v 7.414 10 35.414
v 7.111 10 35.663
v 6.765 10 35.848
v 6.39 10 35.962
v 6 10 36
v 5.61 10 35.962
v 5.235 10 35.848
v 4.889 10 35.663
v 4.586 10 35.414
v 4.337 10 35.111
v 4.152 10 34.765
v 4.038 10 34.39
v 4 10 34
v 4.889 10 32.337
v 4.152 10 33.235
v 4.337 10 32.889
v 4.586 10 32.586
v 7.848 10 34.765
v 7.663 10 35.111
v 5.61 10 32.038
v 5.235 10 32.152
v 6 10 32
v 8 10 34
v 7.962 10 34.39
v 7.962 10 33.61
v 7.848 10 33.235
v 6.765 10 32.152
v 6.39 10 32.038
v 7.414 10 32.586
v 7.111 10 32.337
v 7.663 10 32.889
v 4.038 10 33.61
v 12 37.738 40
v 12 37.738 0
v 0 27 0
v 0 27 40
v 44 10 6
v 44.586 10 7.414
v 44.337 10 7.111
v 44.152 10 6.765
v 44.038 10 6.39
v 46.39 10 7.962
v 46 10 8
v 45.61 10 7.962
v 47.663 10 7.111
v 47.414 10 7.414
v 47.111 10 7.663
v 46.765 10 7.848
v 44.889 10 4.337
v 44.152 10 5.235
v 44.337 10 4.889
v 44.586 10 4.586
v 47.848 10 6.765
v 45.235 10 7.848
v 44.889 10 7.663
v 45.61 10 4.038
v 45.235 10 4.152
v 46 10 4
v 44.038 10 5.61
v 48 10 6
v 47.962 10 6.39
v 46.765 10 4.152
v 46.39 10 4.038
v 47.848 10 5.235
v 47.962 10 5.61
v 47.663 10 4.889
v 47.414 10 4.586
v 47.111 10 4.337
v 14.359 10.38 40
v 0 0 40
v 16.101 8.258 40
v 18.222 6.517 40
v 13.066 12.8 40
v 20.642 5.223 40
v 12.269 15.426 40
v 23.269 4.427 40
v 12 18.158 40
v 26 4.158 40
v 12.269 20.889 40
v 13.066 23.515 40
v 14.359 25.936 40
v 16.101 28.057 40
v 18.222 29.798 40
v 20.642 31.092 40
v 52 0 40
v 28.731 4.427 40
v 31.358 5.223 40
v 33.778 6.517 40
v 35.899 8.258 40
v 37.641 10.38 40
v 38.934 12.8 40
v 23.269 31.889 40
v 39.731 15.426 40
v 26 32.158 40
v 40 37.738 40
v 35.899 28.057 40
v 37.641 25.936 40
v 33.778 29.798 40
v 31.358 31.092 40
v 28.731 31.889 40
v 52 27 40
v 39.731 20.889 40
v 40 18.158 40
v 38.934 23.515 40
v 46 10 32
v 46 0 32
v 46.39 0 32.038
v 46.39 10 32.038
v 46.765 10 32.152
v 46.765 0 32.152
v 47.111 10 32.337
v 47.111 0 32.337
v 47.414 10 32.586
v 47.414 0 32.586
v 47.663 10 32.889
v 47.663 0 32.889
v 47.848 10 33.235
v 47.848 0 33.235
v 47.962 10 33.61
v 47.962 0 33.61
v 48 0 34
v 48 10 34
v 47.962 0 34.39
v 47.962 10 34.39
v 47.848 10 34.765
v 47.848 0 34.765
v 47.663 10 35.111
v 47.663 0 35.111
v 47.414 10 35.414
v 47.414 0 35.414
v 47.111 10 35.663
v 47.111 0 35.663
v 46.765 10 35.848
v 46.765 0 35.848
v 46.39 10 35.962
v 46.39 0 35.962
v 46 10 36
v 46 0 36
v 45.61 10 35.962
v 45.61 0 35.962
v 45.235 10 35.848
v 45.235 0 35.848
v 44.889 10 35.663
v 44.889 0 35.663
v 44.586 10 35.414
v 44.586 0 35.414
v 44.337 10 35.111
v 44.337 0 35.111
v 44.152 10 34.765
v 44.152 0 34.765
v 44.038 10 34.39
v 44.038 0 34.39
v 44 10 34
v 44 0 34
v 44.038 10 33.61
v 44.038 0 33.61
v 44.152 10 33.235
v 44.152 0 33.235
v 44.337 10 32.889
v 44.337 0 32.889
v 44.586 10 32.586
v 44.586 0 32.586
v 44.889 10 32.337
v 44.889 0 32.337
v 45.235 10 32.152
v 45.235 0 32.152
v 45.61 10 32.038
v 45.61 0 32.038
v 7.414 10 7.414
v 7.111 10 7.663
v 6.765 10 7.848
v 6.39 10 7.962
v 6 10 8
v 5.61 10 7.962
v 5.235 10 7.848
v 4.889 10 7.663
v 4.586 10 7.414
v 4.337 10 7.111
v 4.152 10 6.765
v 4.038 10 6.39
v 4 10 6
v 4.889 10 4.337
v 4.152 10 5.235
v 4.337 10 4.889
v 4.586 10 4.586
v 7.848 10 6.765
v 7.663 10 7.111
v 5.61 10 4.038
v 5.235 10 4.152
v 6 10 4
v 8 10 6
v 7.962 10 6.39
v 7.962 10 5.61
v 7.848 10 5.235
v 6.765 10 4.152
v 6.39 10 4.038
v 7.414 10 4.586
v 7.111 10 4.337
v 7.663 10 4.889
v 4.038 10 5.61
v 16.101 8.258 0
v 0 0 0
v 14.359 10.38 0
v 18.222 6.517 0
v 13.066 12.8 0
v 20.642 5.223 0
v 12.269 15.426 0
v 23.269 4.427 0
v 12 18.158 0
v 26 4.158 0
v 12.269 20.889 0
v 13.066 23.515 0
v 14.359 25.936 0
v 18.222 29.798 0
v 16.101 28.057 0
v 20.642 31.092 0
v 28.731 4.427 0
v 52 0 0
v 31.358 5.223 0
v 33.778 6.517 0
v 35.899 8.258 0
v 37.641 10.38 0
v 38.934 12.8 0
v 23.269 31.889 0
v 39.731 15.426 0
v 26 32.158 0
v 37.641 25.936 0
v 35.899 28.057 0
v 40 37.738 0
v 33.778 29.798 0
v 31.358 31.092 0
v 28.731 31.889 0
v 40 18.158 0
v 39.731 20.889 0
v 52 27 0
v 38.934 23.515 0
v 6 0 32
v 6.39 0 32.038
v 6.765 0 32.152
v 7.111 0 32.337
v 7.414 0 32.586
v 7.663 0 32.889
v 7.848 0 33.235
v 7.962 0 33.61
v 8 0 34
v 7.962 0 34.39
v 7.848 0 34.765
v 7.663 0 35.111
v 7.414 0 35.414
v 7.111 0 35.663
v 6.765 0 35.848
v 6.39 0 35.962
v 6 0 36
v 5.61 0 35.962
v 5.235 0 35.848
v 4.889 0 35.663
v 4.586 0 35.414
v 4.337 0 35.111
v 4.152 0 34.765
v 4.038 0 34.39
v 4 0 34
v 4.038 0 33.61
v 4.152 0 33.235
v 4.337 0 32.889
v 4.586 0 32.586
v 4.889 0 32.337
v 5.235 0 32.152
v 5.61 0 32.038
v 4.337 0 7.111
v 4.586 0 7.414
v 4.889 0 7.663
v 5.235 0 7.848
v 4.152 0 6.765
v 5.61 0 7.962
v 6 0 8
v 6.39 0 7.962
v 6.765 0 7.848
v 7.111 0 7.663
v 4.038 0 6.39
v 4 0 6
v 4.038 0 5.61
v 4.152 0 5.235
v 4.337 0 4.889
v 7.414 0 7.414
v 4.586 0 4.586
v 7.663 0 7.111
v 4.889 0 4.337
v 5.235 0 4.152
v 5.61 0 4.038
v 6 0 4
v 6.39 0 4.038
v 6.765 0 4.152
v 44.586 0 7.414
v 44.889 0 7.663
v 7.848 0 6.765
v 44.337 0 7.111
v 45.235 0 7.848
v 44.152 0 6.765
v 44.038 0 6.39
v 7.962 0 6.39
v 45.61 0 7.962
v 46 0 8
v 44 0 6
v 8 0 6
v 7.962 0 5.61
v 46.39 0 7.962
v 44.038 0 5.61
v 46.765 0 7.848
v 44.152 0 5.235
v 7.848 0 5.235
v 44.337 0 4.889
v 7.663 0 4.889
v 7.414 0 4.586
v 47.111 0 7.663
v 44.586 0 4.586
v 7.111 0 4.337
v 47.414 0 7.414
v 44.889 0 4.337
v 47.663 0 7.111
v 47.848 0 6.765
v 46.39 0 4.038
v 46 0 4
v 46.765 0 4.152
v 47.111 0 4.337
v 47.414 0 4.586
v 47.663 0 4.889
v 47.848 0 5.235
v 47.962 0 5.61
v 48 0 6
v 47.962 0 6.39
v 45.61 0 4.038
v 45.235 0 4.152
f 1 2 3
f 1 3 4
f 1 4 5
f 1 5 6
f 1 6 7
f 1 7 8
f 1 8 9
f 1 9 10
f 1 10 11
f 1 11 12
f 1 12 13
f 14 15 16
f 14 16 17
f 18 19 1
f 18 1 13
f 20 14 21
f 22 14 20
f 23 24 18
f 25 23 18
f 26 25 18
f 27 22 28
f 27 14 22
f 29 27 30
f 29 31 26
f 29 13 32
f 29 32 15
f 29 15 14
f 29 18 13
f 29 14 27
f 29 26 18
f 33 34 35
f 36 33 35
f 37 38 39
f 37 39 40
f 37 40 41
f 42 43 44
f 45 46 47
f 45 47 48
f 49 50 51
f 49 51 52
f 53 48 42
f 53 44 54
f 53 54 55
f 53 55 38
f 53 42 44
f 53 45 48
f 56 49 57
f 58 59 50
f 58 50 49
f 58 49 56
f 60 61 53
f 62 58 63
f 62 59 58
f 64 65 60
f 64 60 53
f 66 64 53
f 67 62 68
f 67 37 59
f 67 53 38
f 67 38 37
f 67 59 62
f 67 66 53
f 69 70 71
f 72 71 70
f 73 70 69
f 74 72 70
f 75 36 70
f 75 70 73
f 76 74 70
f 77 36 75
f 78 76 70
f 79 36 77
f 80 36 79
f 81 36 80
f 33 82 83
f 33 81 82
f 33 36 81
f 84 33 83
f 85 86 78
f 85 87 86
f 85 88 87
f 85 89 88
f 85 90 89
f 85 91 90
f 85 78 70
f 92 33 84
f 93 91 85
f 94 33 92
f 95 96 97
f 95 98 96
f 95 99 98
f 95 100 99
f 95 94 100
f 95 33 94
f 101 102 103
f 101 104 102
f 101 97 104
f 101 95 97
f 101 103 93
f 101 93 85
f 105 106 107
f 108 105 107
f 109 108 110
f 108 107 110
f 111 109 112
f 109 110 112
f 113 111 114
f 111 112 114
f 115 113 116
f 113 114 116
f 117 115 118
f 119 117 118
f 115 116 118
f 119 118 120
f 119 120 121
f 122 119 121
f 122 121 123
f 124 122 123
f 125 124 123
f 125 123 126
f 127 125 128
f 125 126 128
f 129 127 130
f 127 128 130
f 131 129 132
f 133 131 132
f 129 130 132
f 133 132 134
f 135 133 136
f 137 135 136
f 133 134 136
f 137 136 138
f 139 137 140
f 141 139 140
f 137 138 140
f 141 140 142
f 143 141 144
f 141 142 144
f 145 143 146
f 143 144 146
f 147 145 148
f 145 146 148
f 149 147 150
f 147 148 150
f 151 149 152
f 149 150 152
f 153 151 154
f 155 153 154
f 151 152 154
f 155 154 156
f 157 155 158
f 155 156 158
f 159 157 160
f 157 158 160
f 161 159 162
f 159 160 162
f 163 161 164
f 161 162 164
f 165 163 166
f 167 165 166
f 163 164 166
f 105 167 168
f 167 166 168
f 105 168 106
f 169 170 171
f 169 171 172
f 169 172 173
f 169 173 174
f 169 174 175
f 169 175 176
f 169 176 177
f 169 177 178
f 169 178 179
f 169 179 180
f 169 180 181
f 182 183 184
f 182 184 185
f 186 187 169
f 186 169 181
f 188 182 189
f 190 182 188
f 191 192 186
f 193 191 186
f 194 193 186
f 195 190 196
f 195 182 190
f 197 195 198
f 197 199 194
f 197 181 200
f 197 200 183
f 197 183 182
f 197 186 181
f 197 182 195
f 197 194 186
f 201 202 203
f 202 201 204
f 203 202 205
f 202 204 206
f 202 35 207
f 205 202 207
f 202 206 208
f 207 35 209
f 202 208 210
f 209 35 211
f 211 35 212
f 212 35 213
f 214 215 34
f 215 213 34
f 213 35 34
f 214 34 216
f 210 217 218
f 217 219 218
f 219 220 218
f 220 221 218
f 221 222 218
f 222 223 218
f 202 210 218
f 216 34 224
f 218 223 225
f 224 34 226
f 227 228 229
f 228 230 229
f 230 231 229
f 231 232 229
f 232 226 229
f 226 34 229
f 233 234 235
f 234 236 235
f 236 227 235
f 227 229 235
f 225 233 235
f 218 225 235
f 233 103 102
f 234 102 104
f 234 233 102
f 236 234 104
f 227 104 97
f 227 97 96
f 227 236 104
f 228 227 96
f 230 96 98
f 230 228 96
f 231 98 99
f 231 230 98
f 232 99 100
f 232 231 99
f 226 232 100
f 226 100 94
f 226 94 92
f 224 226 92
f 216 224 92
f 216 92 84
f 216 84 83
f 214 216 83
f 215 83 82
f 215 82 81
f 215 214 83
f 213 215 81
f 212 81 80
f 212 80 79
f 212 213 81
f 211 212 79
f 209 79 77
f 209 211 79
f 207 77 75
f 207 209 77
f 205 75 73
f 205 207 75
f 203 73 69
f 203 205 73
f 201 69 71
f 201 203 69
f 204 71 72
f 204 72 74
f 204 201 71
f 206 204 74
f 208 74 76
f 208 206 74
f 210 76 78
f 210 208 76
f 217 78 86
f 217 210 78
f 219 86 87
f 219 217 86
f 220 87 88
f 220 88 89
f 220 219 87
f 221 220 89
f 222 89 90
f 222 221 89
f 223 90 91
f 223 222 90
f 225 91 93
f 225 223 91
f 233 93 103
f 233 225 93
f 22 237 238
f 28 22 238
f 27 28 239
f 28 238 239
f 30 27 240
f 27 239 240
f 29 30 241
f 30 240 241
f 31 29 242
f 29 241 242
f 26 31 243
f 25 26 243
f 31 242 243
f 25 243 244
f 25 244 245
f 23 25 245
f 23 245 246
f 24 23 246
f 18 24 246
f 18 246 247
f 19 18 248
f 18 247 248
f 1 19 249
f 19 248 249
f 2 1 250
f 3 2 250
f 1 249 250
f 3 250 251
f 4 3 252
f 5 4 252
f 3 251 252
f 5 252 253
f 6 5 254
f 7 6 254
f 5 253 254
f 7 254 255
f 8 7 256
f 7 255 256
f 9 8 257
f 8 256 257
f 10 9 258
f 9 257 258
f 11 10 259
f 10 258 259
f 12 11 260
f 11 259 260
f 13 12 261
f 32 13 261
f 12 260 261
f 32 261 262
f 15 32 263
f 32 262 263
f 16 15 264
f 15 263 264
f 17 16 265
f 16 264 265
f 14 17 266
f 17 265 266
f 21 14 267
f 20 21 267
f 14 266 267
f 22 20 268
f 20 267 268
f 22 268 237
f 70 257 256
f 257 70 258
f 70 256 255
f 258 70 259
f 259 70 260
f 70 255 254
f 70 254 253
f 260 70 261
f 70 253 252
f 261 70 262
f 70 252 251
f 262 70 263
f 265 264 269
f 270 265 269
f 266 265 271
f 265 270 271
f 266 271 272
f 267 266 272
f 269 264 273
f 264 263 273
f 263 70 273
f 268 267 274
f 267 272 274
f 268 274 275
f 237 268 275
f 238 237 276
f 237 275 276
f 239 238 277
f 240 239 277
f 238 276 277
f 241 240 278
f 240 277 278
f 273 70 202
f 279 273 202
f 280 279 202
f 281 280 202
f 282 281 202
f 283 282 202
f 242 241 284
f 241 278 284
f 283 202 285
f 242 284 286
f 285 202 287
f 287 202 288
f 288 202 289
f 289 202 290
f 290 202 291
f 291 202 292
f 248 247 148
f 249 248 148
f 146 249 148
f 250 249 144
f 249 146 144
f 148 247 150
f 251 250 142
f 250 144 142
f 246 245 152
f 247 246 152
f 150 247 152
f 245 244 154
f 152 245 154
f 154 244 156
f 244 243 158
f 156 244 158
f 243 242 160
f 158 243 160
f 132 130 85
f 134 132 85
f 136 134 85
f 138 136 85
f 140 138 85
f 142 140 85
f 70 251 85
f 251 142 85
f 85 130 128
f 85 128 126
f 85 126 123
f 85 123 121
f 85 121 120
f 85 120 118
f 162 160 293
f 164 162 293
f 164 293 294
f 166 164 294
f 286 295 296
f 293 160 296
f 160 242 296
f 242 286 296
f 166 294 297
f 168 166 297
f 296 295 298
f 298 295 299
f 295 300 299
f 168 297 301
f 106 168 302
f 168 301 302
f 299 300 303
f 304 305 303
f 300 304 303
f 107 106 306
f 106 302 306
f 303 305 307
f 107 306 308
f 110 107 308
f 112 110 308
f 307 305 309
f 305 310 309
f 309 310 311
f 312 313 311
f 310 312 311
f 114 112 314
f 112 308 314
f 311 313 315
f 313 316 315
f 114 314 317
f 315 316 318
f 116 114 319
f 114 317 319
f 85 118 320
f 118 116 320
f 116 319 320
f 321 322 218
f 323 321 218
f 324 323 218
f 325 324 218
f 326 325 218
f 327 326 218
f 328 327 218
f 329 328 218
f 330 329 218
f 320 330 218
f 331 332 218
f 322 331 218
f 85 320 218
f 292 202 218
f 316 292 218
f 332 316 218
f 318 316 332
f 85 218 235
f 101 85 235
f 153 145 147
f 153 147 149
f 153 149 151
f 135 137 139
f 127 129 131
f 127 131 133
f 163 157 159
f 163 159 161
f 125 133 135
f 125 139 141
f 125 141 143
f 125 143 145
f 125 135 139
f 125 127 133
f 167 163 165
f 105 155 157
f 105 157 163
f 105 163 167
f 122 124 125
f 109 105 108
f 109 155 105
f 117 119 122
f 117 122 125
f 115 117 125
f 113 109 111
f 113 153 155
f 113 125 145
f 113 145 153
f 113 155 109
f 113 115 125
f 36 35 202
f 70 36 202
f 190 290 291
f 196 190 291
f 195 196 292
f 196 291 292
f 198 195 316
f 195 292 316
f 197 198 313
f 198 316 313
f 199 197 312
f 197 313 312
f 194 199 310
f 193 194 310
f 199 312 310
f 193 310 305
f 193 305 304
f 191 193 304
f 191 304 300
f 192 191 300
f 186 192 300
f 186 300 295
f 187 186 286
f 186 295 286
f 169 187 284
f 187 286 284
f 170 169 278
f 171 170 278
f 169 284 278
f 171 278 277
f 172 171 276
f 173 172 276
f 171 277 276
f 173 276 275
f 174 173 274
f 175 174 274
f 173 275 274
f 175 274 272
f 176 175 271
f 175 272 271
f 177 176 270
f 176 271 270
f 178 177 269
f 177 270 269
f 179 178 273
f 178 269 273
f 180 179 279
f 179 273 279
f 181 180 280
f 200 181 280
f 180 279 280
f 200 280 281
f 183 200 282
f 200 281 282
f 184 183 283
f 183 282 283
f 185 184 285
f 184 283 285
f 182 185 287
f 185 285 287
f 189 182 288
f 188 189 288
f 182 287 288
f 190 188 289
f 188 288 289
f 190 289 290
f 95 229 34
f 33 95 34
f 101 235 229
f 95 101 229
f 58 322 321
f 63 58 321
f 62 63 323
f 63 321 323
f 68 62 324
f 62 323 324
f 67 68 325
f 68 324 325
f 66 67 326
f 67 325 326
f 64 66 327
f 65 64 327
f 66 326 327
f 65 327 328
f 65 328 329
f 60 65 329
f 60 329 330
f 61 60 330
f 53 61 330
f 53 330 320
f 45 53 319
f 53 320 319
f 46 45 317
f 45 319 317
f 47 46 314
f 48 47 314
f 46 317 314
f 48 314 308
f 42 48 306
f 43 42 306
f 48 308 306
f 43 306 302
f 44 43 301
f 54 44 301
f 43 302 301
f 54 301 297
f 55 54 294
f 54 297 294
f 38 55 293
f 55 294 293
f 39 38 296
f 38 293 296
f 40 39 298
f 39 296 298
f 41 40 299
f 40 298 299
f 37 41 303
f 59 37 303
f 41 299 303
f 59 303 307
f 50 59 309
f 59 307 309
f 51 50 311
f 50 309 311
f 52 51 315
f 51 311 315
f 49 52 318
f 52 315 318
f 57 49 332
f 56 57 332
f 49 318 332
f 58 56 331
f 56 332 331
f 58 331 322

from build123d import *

# Parameters (mm, degrees)
SKETCH1_R           = 14
BOSS_EXTRUDE1_DEPTH = 40
SKETCH2_R           = 2
CUT_EXTRUDE1_DEPTH  = 10


with BuildPart() as part:
    # Sketch1 → Boss-Extrude1 (new body)
    with BuildSketch(Plane.XY):
        Polygon((0, 0), (52, 0), (52, 27), (40, 37.737759826), (12, 37.737759826), (0, 27), align=None)
        with Locations((26, 18.157759826)):
            Circle(SKETCH1_R, mode=Mode.SUBTRACT)
    extrude(amount=BOSS_EXTRUDE1_DEPTH)

    # Sketch2 → Cut-Extrude1 (cut)
    with BuildSketch(Plane.XZ):
        with Locations(Location((6, 34, 0), (0, 0, 270))):
            Circle(SKETCH2_R)
        with Locations(Location((46, 34, 0), (0, 0, 270))):
            Circle(SKETCH2_R)
        with Locations(Location((6, 6, 0), (0, 0, 270))):
            Circle(SKETCH2_R)
        with Locations(Location((46, 6, 0), (0, 0, 270))):
            Circle(SKETCH2_R)
    extrude(amount=-CUT_EXTRUDE1_DEPTH, mode=Mode.SUBTRACT)


solid = part.part
